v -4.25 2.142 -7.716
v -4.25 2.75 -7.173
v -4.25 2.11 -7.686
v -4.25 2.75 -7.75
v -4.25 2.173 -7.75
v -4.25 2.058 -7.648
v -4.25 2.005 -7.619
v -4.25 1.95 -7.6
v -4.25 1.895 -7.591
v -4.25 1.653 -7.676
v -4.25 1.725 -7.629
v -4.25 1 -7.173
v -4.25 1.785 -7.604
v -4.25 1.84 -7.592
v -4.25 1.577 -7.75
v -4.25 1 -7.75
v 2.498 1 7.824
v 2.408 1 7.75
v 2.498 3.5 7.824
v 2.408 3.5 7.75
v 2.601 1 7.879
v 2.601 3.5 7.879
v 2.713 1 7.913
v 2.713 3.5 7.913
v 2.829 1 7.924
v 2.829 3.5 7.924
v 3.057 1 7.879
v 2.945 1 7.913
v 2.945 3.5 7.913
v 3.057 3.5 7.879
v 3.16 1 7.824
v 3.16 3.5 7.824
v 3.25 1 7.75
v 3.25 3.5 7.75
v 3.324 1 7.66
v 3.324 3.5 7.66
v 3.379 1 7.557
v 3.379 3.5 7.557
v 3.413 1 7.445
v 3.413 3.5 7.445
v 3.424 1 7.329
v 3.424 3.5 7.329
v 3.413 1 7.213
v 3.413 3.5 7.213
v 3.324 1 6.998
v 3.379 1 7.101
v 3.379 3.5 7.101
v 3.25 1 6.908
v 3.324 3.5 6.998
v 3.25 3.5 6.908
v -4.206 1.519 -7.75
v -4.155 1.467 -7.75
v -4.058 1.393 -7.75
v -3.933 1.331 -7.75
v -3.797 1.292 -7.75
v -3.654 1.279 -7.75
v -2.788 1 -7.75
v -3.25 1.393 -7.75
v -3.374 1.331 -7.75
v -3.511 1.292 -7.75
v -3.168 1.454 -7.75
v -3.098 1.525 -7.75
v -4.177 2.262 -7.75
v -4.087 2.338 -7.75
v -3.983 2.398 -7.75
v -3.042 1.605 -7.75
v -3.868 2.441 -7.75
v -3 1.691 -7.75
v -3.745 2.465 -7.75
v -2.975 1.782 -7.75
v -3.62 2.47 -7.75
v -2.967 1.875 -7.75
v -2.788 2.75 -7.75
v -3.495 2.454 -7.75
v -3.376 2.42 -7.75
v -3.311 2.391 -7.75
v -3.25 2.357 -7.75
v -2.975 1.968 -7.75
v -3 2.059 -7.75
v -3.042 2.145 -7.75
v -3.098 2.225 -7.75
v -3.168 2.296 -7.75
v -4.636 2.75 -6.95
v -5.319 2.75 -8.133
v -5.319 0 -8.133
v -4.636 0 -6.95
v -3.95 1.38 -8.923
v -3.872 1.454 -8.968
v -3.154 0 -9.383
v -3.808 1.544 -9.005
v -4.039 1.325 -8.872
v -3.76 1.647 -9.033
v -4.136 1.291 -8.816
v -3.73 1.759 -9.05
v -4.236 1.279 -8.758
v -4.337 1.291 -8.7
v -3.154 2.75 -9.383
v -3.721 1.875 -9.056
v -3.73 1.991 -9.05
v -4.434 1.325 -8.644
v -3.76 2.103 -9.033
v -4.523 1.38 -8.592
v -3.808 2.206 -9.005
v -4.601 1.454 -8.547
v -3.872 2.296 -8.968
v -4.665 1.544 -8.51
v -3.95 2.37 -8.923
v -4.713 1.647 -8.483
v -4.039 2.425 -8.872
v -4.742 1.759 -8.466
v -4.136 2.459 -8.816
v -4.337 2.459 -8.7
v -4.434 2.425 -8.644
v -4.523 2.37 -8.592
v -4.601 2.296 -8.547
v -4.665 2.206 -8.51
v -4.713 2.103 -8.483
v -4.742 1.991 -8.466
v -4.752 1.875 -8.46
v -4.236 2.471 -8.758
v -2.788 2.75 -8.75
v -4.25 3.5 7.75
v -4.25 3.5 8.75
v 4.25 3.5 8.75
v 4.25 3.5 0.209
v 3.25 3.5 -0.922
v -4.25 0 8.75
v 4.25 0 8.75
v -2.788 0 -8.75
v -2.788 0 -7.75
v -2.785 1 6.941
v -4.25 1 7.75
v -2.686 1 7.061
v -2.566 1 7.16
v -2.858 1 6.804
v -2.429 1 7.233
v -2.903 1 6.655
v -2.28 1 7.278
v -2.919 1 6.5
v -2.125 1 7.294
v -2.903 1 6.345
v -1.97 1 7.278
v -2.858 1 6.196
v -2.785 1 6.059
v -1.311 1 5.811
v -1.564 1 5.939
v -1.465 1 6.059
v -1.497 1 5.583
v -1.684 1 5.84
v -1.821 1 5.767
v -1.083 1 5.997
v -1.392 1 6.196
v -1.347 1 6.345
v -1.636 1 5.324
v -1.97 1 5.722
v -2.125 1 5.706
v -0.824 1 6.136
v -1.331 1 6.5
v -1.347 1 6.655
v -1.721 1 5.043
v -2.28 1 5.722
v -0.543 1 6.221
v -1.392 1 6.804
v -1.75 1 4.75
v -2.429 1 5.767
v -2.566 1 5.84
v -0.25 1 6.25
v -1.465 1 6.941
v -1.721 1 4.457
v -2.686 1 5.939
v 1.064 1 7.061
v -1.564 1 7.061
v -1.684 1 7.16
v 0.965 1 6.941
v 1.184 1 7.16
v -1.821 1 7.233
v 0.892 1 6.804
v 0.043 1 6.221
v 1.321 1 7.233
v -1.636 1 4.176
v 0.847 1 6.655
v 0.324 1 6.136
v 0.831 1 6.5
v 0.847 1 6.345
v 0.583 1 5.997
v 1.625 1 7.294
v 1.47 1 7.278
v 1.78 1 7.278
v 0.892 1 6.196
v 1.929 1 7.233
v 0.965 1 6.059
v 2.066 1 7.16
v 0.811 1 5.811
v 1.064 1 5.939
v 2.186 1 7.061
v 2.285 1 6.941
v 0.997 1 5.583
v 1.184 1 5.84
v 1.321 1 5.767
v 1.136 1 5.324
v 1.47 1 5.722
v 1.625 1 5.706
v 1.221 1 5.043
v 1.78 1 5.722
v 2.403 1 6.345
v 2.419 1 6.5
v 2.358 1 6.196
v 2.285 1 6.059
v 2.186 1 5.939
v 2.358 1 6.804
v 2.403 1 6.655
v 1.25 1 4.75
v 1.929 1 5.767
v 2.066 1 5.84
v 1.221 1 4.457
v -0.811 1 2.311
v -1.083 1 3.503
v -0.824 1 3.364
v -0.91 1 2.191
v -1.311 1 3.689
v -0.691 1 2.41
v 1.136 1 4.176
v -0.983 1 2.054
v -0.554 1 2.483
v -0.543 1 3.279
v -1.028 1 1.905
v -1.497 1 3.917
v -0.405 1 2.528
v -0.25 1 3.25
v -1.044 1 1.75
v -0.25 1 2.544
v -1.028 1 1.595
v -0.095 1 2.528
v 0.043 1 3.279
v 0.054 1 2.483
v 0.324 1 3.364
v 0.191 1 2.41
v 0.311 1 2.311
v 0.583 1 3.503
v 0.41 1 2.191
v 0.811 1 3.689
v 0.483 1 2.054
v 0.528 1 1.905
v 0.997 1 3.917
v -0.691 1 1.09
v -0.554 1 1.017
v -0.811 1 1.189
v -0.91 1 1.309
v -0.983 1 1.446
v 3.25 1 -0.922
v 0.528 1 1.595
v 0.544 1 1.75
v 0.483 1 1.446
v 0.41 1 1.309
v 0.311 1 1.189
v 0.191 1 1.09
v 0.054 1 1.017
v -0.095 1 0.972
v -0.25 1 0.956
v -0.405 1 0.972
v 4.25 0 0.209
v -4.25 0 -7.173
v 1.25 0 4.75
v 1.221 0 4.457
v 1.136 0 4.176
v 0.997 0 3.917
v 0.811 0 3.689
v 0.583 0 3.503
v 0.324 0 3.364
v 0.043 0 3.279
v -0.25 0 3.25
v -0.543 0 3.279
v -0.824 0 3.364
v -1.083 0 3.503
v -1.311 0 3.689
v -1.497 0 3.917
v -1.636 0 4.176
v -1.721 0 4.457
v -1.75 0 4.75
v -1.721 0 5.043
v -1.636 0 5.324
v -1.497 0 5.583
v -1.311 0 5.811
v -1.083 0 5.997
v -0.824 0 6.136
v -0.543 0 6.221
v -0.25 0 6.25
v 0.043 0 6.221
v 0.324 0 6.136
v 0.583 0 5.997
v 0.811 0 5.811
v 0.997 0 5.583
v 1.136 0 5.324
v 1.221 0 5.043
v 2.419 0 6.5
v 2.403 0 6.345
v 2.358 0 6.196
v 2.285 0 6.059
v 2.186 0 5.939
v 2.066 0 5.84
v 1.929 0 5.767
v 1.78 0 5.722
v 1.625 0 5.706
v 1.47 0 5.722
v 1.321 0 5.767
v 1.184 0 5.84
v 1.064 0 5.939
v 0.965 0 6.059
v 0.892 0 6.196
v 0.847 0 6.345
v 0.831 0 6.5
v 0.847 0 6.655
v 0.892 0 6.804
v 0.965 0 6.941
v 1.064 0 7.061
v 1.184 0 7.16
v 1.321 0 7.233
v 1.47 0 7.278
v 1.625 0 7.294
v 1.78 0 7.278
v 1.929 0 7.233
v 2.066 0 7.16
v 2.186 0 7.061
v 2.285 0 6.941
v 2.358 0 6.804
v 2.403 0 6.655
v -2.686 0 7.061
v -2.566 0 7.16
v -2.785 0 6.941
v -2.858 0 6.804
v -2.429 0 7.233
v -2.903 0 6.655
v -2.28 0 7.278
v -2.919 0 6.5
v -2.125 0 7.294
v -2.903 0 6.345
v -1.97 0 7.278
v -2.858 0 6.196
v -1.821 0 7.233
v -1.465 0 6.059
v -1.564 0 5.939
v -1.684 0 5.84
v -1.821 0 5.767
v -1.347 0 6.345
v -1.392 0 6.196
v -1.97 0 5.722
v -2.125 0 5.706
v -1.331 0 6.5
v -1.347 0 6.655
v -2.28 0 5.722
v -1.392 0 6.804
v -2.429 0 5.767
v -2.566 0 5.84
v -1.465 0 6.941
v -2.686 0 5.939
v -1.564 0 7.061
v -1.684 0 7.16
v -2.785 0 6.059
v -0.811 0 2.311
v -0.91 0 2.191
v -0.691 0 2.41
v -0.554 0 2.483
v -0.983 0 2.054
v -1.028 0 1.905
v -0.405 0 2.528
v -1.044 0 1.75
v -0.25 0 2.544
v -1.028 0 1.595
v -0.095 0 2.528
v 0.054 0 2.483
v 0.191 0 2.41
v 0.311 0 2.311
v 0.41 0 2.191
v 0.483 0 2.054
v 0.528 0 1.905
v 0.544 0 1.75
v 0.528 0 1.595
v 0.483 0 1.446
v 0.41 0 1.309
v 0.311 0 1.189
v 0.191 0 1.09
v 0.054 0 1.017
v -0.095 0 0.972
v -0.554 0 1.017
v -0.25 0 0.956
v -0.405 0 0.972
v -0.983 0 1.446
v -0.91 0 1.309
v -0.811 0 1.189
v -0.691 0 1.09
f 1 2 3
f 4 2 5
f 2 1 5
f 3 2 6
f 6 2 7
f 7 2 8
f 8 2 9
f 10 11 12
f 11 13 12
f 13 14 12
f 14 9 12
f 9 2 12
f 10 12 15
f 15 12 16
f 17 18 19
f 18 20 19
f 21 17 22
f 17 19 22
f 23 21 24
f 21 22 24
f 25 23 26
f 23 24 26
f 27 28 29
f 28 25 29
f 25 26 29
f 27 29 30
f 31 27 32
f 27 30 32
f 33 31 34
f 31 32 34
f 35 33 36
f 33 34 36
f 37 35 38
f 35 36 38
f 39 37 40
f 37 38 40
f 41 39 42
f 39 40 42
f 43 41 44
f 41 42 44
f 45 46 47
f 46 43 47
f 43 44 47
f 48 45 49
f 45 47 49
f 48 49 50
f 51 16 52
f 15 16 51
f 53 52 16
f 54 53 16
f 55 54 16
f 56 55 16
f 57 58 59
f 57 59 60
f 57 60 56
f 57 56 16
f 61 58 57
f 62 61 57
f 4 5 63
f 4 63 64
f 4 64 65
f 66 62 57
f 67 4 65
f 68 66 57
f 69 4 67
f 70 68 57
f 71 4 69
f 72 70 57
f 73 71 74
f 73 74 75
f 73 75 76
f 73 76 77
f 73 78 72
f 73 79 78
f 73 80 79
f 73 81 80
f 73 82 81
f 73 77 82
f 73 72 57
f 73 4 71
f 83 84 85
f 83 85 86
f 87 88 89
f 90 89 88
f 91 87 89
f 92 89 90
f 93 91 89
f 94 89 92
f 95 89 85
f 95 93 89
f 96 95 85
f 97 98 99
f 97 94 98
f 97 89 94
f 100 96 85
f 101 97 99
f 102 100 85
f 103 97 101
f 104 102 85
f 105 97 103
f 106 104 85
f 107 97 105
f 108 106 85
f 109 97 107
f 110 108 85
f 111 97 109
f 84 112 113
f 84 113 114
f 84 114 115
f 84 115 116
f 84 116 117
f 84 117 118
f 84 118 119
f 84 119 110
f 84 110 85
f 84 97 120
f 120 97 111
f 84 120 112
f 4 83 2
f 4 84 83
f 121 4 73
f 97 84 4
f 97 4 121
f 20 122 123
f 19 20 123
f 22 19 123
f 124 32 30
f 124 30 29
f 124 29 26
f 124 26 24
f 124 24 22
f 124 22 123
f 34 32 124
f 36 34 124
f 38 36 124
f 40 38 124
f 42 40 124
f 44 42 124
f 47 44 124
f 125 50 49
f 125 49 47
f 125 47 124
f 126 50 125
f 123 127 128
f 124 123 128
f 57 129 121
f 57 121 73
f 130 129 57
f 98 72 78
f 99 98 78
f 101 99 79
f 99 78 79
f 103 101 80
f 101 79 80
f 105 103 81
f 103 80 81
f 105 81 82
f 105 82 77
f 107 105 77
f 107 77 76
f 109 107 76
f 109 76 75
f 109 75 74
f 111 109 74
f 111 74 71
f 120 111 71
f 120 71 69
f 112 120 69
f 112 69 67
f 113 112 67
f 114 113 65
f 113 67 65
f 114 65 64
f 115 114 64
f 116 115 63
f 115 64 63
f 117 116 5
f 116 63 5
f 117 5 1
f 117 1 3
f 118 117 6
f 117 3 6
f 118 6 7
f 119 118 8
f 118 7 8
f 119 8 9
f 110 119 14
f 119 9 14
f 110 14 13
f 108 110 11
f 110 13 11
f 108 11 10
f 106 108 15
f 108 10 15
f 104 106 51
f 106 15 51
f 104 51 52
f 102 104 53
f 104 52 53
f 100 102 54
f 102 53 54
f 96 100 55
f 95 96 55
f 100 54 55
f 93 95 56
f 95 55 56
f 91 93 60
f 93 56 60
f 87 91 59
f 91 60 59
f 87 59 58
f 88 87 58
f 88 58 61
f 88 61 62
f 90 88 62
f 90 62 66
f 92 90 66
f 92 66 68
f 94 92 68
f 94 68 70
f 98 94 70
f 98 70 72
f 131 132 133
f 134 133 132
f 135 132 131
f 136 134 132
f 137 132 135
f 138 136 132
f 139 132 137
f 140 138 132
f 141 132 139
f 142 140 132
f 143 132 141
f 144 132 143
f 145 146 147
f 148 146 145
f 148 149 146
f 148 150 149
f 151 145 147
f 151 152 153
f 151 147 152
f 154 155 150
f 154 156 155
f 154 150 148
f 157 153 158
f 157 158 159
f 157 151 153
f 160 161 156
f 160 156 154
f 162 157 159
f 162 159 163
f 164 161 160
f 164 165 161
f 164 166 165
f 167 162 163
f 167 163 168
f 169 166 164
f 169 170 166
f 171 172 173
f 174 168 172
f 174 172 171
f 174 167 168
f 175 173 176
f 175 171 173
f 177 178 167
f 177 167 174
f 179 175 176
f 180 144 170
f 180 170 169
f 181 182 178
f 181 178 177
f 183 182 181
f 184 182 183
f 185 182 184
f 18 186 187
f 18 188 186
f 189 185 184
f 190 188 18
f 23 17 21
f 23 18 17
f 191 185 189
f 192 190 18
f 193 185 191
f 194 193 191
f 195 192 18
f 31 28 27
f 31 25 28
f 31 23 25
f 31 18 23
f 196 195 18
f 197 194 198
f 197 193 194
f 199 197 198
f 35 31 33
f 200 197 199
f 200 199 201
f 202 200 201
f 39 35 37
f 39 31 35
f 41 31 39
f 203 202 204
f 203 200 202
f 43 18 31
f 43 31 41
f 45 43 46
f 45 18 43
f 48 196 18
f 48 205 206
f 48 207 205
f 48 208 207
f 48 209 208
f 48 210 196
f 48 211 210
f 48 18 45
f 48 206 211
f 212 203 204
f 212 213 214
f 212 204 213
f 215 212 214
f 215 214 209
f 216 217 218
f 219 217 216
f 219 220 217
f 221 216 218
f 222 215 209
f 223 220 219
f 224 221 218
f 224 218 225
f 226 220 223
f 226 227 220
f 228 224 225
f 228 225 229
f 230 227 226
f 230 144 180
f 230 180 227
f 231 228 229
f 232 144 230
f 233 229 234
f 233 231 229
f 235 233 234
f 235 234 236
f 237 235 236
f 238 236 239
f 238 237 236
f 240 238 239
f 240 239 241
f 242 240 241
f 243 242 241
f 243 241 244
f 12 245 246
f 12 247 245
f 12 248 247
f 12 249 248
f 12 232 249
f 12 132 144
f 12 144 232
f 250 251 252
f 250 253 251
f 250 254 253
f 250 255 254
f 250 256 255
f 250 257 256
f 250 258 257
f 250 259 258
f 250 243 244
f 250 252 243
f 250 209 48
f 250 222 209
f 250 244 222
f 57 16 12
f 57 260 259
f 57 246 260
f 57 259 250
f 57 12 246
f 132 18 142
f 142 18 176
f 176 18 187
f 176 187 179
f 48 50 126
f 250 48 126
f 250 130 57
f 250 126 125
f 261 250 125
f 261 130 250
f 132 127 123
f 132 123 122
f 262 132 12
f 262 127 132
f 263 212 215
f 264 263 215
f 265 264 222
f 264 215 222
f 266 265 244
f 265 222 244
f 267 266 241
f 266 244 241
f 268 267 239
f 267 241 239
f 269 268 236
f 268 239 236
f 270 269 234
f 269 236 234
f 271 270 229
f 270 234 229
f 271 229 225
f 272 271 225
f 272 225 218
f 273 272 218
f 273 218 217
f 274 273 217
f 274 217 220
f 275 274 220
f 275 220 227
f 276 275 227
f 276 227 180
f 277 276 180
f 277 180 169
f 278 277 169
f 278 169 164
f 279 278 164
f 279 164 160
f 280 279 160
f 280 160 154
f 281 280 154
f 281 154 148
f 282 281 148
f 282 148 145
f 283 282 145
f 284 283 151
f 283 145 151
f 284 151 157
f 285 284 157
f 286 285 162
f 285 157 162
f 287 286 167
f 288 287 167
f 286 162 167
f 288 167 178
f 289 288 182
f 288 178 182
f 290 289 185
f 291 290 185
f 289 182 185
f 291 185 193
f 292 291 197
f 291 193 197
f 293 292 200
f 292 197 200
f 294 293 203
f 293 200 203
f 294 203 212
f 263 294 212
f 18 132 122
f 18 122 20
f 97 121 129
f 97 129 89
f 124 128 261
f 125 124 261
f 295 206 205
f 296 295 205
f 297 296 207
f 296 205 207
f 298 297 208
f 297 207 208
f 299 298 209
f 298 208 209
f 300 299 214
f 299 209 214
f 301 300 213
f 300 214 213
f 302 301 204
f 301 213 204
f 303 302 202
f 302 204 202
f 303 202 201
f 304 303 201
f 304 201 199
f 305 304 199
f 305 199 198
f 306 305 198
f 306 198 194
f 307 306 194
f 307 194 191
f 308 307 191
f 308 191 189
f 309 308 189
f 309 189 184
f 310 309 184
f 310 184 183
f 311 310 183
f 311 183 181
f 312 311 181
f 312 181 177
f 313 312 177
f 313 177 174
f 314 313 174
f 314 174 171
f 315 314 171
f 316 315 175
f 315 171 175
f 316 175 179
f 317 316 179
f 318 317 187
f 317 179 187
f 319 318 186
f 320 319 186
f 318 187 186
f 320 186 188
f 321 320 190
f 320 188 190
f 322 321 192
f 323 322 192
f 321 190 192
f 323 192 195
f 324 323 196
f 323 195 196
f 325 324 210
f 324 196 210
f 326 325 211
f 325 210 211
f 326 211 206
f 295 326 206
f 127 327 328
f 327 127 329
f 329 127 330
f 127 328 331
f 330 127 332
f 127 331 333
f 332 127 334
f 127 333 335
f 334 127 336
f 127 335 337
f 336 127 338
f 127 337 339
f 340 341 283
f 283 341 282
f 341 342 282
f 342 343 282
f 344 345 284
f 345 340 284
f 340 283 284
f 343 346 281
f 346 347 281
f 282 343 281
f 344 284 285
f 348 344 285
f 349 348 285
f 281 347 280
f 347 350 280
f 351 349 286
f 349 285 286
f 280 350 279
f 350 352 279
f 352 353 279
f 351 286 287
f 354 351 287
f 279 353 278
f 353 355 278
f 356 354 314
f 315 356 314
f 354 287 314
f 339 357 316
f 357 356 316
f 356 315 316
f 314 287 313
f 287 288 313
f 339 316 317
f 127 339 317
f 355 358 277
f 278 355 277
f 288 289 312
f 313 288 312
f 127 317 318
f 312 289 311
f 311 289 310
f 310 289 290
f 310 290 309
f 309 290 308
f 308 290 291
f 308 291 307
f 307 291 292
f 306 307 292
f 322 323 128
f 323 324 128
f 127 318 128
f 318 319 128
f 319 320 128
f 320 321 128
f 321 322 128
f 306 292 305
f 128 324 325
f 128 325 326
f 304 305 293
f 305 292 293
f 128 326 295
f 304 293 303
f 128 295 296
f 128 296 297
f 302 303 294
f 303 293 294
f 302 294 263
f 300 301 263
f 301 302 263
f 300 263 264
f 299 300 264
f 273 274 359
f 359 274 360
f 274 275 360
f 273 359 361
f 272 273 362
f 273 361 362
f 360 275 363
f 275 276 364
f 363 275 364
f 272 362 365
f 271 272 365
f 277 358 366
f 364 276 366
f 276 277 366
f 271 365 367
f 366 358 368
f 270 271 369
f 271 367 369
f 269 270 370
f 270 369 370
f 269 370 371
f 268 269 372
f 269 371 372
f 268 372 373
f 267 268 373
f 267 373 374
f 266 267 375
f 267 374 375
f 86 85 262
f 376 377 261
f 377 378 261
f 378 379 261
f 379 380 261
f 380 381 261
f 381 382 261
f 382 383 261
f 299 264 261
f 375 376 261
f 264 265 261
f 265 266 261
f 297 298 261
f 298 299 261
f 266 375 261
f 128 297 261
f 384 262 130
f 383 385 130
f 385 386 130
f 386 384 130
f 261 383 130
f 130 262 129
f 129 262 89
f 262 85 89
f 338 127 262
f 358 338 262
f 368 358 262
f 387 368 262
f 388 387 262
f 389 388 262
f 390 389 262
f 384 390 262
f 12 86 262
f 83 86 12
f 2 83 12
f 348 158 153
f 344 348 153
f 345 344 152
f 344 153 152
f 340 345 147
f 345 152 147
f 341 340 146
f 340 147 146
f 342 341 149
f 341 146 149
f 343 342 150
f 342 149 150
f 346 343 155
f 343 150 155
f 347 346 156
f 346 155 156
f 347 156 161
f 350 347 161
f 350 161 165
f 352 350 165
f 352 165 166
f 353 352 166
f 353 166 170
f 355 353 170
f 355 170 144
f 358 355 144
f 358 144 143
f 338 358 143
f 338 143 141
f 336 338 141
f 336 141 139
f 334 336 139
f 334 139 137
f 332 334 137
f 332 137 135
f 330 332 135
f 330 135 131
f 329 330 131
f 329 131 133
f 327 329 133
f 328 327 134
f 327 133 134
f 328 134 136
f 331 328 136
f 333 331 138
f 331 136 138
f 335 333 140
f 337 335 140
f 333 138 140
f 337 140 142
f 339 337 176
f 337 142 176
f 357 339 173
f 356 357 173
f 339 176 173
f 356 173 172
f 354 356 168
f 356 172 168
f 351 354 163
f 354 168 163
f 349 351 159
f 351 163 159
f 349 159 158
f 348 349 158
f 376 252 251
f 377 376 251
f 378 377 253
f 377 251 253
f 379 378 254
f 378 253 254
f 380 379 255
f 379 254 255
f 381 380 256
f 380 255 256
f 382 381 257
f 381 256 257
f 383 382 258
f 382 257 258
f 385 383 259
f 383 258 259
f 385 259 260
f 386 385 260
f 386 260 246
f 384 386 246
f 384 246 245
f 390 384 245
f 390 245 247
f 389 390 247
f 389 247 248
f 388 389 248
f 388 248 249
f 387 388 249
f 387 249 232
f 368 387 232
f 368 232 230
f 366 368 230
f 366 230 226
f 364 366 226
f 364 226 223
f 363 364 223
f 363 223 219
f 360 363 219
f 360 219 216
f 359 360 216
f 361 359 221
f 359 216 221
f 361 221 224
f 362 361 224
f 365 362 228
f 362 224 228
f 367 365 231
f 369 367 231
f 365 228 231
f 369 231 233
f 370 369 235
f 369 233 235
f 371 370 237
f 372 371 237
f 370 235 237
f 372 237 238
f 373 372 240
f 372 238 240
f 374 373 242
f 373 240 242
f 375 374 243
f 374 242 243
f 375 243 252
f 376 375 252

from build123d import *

# Parameters (mm, degrees)
SKETCH1_W                     = 8.5
SKETCH1_H                     = 17.5
BOSS_EXTRUDE1_DEPTH           = 3.5
SKETCH2_W                     = 6.5
SKETCH2_H                     = 15.5
CUT_EXTRUDE1_DEPTH            = 2.5
SKETCH3_R                     = 1.5
GRIN_HOLE_DEPTH               = 2
SKETCH6_R                     = 0.5953125
CORNER_DIVOT_DEPTH            = 2.5
SKETCH7_R                     = 0.79375
MAGNET_HOLES_DEPTH            = 2
BOSS_EXTRUDE2_DEPTH           = 3.5
SKETCH14_W                    = 5.965258944
SKETCH14_H                    = 5.132960456
SET_SCREW_EXTENSION_DEPTH     = 0.75
TAP_DRILL_FOR_0_80_TAP1_D     = 1.19126
TAP_DRILL_FOR_0_80_TAP1_DEPTH = 7.11
TAP_DRILL_FOR_0_80_TAP1_TIP   = 0.357890611
DIAGONAL_CUT_DEPTH            = 5
SKETCH16_W                    = 1
SKETCH16_H                    = 15.5
VERTICAL_CUT_DEPTH            = 3


with BuildPart() as part:
    # Sketch1 → Boss-Extrude1 (new body)
    with BuildSketch(Plane(origin=(0, 0, 0), x_dir=(1, 0, 0), z_dir=(0, 1, 0))):
        Rectangle(SKETCH1_W, SKETCH1_H)
    extrude(amount=BOSS_EXTRUDE1_DEPTH)

    # Sketch2 → Cut-Extrude1 (cut)
    with BuildSketch(Plane(origin=(0, 3.5, 0), x_dir=(1, 0, 0), z_dir=(0, 1, 0))):
        Rectangle(SKETCH2_W, SKETCH2_H)
    extrude(amount=-CUT_EXTRUDE1_DEPTH, mode=Mode.SUBTRACT)

    # Sketch3 → GRIN Hole (cut, through all)
    with BuildSketch(Plane(origin=(0, 1, 0), x_dir=(1, 0, 0), z_dir=(0, 1, 0))):
        with Locations((-0.25, -4.75)):
            Circle(SKETCH3_R)
    extrude(amount=-GRIN_HOLE_DEPTH, mode=Mode.SUBTRACT)

    # Sketch6 → Corner divot (cut)
    with BuildSketch(Plane(origin=(0, 3.5, 0), x_dir=(1, 0, 0), z_dir=(0, 1, 0))):
        with Locations((2.829050494, -7.329050494)):
            Circle(SKETCH6_R)
    extrude(amount=-CORNER_DIVOT_DEPTH, mode=Mode.SUBTRACT)

    # Sketch7 → Magnet Holes (cut, through all)
    with BuildSketch(Plane(origin=(0, 1, 0), x_dir=(1, 0, 0), z_dir=(0, 1, 0))):
        with Locations((-0.25, -1.75)):
            Circle(SKETCH7_R)
        with Locations((-2.125, -6.5)):
            Circle(SKETCH7_R)
        with Locations((1.625, -6.5)):
            Circle(SKETCH7_R)
    extrude(amount=-MAGNET_HOLES_DEPTH, mode=Mode.SUBTRACT)

    # Sketch9 → Boss-Extrude2 (add)
    with BuildSketch(Plane(origin=(0, 3.5, 0), x_dir=(1, 0, 0), z_dir=(0, 1, 0))):
        Polygon((-3.153871189, 9.382850264), (-5.318934698, 8.132850264), (-4.635921996, 6.949837562), (-4.021927306, 7.304327562), (-3.084853178, 7.845347562), (-2.470858487, 8.199837562), align=None)
    extrude(amount=-BOSS_EXTRUDE2_DEPTH)

    # Sketch14 → Set Screw Extension (cut)
    with BuildSketch(Plane(origin=(0, 3.5, 0), x_dir=(1, 0, 0), z_dir=(0, 1, 0))):
        with Locations((-3.25, 7.75)):
            Rectangle(SKETCH14_W, SKETCH14_H)
    extrude(amount=-SET_SCREW_EXTENSION_DEPTH, mode=Mode.SUBTRACT)

    # Tap Drill for #0-80 Tap1
    with Locations(Plane(origin=(-4.851361142, 0, -8.402803983), x_dir=(-0.866025404, 0, 0.5), z_dir=(-0.5, 0, -0.866025404))):
        with Locations((-0.710092562, 1.875)):
            Hole(TAP_DRILL_FOR_0_80_TAP1_D / 2, depth=TAP_DRILL_FOR_0_80_TAP1_DEPTH)
            with Locations((0, 0, -(TAP_DRILL_FOR_0_80_TAP1_DEPTH + TAP_DRILL_FOR_0_80_TAP1_TIP / 2))):  # 118° drill point
                Cone(0, TAP_DRILL_FOR_0_80_TAP1_D / 2, TAP_DRILL_FOR_0_80_TAP1_TIP, mode=Mode.SUBTRACT)

    # Sketch15 → Diagonal Cut (cut)
    with BuildSketch(Plane(origin=(0, 0, 0), x_dir=(1, 0, 0), z_dir=(0, 1, 0))):
        Polygon((-2.788494918, 9.313235547), (-2.788494918, 7.75), (4.25, -0.208562074), (4.25, 9.313235547), align=None)
    extrude(amount=DIAGONAL_CUT_DEPTH, mode=Mode.SUBTRACT)

    # Sketch16 → Vertical Cut (cut)
    with BuildSketch(Plane(origin=(0, 1, 0), x_dir=(1, 0, 0), z_dir=(0, 1, 0))):
        with Locations((-3.75, 0)):
            Rectangle(SKETCH16_W, SKETCH16_H)
    extrude(amount=VERTICAL_CUT_DEPTH, mode=Mode.SUBTRACT)


solid = part.part
